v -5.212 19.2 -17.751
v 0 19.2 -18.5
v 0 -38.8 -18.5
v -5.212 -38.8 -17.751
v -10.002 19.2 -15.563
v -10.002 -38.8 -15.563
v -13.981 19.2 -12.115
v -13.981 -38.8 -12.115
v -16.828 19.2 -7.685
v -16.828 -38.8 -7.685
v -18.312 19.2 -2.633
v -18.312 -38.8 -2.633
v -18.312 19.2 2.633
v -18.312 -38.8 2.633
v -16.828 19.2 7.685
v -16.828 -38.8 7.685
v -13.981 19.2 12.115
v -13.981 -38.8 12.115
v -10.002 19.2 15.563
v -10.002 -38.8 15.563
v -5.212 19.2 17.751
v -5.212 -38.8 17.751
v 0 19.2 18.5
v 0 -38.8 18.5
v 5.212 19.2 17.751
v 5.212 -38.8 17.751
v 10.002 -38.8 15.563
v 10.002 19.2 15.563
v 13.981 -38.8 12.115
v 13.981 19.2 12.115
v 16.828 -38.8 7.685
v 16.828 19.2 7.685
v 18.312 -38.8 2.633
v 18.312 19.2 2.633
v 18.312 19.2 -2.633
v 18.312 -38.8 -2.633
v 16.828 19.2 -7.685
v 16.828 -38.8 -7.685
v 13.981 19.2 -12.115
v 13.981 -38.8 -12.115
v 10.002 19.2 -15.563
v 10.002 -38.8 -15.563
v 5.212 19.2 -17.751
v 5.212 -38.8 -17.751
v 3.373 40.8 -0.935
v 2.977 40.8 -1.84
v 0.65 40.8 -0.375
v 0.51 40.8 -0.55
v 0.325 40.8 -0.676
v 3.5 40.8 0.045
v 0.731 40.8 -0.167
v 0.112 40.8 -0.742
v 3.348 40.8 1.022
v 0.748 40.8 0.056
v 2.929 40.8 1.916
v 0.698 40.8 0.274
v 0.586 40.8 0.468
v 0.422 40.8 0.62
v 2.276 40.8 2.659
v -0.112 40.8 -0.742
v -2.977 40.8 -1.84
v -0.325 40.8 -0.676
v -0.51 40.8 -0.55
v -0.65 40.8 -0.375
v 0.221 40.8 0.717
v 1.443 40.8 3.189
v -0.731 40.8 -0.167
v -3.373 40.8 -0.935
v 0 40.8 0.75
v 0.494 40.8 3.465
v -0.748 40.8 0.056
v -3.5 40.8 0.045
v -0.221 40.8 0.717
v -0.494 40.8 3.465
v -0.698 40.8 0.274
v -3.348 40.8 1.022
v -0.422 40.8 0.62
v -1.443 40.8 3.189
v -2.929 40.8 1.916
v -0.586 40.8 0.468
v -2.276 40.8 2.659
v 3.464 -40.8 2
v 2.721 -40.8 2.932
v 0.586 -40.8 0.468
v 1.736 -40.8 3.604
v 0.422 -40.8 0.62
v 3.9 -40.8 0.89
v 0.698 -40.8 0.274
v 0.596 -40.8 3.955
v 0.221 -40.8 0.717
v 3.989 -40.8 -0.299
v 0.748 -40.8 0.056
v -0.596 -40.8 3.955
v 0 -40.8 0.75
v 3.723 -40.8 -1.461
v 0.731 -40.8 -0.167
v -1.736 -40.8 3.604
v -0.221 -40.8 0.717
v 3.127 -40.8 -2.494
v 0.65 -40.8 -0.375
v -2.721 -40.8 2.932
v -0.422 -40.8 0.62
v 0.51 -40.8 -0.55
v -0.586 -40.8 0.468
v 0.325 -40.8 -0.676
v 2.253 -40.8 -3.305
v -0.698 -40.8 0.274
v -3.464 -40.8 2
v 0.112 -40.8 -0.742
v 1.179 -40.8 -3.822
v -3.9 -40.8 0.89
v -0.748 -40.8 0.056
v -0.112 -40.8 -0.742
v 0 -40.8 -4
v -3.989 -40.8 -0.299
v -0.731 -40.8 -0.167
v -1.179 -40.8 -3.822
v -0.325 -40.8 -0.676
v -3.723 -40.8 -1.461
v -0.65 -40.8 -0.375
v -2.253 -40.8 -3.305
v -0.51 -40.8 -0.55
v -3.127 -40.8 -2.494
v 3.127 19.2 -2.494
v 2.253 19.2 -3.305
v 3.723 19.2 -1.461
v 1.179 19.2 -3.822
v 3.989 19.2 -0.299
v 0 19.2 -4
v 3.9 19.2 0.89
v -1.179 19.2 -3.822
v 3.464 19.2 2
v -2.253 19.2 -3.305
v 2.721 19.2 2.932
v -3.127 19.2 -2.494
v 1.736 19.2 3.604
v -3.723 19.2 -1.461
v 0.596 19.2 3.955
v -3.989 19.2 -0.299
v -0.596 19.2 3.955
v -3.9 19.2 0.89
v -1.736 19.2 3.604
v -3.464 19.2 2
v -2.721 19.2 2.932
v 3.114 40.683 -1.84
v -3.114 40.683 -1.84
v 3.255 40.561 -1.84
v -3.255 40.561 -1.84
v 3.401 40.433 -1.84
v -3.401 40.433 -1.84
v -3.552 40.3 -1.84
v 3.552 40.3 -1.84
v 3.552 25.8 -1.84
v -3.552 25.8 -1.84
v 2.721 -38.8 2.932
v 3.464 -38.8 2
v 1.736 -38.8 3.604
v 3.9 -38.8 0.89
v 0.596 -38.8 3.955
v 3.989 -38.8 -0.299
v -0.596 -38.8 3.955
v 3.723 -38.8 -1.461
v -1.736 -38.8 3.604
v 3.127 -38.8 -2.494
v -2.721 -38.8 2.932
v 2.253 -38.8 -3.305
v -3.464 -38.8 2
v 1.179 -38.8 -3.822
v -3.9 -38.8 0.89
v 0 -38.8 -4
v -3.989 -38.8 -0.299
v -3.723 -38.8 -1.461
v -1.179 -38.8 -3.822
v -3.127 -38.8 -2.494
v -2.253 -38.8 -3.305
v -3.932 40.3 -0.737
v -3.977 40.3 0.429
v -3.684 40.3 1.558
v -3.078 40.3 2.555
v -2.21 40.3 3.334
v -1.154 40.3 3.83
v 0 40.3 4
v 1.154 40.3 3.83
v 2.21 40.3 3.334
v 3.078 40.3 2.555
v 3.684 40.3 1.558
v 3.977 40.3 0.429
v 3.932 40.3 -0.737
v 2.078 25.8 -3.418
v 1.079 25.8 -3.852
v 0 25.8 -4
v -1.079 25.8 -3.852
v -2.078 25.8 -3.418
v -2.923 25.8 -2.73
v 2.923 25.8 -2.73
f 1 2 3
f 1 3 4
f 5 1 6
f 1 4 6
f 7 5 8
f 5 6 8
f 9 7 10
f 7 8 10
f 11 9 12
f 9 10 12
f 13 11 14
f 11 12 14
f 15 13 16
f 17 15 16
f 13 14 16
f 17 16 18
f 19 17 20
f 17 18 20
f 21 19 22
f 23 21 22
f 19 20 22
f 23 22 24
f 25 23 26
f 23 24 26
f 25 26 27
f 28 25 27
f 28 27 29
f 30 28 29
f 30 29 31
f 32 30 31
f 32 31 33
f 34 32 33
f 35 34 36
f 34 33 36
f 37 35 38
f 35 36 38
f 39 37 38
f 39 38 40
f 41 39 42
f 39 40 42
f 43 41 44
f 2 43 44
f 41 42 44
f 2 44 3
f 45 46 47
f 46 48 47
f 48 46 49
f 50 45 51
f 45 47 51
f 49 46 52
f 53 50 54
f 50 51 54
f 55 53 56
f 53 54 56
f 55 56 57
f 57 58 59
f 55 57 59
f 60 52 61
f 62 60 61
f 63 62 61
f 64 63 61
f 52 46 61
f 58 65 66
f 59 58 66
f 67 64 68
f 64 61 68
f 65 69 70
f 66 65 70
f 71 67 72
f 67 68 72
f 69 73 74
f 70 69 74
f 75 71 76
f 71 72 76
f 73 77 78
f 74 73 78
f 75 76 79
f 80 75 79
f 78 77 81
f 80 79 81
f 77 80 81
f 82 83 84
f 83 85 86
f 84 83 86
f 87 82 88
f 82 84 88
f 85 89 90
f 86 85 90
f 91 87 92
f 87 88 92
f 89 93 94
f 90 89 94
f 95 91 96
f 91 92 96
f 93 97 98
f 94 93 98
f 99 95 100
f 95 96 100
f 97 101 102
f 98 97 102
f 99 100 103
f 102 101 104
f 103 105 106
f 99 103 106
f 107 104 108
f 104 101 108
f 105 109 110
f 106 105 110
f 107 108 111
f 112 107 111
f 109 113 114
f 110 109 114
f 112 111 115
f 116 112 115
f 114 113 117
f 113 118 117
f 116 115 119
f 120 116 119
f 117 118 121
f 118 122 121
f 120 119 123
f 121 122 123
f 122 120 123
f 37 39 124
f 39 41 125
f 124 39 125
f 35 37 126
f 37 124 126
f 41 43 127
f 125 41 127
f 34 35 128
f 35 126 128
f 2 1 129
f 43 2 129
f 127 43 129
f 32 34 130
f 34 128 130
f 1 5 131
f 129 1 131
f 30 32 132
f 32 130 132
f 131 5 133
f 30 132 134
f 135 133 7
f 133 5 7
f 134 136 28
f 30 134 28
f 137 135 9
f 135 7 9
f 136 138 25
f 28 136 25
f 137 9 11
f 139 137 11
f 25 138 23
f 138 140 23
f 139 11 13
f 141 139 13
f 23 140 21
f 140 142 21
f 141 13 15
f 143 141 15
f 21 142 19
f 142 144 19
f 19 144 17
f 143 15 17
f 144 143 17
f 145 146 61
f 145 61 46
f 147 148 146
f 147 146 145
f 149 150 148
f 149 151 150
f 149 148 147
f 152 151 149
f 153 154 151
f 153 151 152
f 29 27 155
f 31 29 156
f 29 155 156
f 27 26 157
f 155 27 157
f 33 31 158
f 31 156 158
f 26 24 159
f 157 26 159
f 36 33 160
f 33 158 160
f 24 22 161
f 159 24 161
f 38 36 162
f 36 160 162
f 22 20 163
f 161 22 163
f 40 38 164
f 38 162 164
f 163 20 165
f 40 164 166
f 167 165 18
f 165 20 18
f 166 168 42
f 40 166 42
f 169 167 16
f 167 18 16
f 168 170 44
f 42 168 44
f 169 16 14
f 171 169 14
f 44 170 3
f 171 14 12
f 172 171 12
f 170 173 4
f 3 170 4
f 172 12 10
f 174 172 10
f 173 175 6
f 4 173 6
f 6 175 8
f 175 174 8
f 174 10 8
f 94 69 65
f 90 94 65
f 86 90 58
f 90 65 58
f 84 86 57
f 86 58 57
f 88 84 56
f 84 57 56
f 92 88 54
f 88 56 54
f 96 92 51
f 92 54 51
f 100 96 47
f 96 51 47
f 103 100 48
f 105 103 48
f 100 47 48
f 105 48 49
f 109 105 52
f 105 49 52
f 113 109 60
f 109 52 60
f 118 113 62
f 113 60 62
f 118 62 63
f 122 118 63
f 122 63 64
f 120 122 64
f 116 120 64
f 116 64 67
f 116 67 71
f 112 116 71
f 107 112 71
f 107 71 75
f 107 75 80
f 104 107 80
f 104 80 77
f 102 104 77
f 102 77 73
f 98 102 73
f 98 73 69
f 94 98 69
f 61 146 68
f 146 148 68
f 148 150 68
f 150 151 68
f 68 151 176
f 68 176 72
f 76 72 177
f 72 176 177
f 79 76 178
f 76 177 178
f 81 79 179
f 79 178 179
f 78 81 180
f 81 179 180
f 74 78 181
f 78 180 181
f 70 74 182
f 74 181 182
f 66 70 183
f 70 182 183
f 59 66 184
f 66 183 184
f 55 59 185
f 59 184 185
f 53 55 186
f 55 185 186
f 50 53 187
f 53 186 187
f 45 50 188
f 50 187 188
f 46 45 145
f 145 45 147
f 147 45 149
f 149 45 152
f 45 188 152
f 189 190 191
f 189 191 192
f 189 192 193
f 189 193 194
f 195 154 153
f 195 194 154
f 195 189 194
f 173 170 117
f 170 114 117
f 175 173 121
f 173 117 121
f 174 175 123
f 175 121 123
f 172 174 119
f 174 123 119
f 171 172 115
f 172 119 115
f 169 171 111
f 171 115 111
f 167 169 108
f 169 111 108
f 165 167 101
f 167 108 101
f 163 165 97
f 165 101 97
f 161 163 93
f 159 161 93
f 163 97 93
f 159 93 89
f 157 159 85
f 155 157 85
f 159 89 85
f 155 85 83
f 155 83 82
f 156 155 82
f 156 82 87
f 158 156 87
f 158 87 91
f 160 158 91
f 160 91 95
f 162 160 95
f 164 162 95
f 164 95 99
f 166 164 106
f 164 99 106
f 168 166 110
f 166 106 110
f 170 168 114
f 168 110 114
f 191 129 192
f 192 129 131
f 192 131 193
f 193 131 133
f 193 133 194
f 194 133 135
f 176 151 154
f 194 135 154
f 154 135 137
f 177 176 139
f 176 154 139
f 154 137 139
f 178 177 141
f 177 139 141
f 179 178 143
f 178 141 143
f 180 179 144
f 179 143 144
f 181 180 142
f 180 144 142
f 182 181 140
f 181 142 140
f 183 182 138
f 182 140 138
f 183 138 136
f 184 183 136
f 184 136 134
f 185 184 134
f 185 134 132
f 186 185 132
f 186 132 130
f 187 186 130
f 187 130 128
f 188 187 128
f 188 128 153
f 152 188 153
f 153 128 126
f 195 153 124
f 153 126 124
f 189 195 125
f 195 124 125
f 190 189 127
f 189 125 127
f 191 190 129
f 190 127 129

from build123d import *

# Parameters (mm, degrees)
CHAMFER1_SIZE      = 0.5
CUT_EXTRUDE1_START = -15
CUT_EXTRUDE1_DEPTH = 15
SKETCH3_R          = 0.75
CUT_EXTRUDE2_DEPTH = 86.691656537


with BuildPart() as part:
    # Sketch1 → Revolve1 (revolve)
    with BuildSketch(Plane(origin=(0, 0, 0), x_dir=(0, 0, -1), z_dir=(1, 0, 0))):
        Polygon((0, -40.8), (0, 40.8), (4, 40.8), (4, 19.2), (18.5, 19.2), (18.5, -38.8), (4, -38.8), (4, -40.8), align=None)
    revolve(axis=Axis((0, -40.8, 0), (0, 1, 0)))

    # Chamfer1
    chamfer1_edges = [part.edges().sort_by_distance(p)[0] for p in [
        (0, 40.8, 4),
    ]]
    chamfer(chamfer1_edges, length=CHAMFER1_SIZE)

    # Sketch2 → Cut-Extrude1 (cut)
    with BuildSketch(Plane(origin=(0, 40.8, 0), x_dir=(1, 0, 0), z_dir=(0, 1, 0)).offset(CUT_EXTRUDE1_START)):
        with BuildLine():
            Line((-3.551675661, 1.84), (3.551675661, 1.84))
            ThreePointArc((3.551675661, 1.84), (0, 4), (-3.551675661, 1.84))
        make_face()
    extrude(amount=CUT_EXTRUDE1_DEPTH, mode=Mode.SUBTRACT)

    # Sketch3 → Cut-Extrude2 (cut, through all)
    with BuildSketch(Plane(origin=(0, 40.8, 0), x_dir=(1, 0, 0), z_dir=(0, 1, 0))):
        with Locations(Location((0, 0, 0), (0, 0, 270))):
            Circle(SKETCH3_R)
    extrude(amount=-CUT_EXTRUDE2_DEPTH, mode=Mode.SUBTRACT)


solid = part.part
